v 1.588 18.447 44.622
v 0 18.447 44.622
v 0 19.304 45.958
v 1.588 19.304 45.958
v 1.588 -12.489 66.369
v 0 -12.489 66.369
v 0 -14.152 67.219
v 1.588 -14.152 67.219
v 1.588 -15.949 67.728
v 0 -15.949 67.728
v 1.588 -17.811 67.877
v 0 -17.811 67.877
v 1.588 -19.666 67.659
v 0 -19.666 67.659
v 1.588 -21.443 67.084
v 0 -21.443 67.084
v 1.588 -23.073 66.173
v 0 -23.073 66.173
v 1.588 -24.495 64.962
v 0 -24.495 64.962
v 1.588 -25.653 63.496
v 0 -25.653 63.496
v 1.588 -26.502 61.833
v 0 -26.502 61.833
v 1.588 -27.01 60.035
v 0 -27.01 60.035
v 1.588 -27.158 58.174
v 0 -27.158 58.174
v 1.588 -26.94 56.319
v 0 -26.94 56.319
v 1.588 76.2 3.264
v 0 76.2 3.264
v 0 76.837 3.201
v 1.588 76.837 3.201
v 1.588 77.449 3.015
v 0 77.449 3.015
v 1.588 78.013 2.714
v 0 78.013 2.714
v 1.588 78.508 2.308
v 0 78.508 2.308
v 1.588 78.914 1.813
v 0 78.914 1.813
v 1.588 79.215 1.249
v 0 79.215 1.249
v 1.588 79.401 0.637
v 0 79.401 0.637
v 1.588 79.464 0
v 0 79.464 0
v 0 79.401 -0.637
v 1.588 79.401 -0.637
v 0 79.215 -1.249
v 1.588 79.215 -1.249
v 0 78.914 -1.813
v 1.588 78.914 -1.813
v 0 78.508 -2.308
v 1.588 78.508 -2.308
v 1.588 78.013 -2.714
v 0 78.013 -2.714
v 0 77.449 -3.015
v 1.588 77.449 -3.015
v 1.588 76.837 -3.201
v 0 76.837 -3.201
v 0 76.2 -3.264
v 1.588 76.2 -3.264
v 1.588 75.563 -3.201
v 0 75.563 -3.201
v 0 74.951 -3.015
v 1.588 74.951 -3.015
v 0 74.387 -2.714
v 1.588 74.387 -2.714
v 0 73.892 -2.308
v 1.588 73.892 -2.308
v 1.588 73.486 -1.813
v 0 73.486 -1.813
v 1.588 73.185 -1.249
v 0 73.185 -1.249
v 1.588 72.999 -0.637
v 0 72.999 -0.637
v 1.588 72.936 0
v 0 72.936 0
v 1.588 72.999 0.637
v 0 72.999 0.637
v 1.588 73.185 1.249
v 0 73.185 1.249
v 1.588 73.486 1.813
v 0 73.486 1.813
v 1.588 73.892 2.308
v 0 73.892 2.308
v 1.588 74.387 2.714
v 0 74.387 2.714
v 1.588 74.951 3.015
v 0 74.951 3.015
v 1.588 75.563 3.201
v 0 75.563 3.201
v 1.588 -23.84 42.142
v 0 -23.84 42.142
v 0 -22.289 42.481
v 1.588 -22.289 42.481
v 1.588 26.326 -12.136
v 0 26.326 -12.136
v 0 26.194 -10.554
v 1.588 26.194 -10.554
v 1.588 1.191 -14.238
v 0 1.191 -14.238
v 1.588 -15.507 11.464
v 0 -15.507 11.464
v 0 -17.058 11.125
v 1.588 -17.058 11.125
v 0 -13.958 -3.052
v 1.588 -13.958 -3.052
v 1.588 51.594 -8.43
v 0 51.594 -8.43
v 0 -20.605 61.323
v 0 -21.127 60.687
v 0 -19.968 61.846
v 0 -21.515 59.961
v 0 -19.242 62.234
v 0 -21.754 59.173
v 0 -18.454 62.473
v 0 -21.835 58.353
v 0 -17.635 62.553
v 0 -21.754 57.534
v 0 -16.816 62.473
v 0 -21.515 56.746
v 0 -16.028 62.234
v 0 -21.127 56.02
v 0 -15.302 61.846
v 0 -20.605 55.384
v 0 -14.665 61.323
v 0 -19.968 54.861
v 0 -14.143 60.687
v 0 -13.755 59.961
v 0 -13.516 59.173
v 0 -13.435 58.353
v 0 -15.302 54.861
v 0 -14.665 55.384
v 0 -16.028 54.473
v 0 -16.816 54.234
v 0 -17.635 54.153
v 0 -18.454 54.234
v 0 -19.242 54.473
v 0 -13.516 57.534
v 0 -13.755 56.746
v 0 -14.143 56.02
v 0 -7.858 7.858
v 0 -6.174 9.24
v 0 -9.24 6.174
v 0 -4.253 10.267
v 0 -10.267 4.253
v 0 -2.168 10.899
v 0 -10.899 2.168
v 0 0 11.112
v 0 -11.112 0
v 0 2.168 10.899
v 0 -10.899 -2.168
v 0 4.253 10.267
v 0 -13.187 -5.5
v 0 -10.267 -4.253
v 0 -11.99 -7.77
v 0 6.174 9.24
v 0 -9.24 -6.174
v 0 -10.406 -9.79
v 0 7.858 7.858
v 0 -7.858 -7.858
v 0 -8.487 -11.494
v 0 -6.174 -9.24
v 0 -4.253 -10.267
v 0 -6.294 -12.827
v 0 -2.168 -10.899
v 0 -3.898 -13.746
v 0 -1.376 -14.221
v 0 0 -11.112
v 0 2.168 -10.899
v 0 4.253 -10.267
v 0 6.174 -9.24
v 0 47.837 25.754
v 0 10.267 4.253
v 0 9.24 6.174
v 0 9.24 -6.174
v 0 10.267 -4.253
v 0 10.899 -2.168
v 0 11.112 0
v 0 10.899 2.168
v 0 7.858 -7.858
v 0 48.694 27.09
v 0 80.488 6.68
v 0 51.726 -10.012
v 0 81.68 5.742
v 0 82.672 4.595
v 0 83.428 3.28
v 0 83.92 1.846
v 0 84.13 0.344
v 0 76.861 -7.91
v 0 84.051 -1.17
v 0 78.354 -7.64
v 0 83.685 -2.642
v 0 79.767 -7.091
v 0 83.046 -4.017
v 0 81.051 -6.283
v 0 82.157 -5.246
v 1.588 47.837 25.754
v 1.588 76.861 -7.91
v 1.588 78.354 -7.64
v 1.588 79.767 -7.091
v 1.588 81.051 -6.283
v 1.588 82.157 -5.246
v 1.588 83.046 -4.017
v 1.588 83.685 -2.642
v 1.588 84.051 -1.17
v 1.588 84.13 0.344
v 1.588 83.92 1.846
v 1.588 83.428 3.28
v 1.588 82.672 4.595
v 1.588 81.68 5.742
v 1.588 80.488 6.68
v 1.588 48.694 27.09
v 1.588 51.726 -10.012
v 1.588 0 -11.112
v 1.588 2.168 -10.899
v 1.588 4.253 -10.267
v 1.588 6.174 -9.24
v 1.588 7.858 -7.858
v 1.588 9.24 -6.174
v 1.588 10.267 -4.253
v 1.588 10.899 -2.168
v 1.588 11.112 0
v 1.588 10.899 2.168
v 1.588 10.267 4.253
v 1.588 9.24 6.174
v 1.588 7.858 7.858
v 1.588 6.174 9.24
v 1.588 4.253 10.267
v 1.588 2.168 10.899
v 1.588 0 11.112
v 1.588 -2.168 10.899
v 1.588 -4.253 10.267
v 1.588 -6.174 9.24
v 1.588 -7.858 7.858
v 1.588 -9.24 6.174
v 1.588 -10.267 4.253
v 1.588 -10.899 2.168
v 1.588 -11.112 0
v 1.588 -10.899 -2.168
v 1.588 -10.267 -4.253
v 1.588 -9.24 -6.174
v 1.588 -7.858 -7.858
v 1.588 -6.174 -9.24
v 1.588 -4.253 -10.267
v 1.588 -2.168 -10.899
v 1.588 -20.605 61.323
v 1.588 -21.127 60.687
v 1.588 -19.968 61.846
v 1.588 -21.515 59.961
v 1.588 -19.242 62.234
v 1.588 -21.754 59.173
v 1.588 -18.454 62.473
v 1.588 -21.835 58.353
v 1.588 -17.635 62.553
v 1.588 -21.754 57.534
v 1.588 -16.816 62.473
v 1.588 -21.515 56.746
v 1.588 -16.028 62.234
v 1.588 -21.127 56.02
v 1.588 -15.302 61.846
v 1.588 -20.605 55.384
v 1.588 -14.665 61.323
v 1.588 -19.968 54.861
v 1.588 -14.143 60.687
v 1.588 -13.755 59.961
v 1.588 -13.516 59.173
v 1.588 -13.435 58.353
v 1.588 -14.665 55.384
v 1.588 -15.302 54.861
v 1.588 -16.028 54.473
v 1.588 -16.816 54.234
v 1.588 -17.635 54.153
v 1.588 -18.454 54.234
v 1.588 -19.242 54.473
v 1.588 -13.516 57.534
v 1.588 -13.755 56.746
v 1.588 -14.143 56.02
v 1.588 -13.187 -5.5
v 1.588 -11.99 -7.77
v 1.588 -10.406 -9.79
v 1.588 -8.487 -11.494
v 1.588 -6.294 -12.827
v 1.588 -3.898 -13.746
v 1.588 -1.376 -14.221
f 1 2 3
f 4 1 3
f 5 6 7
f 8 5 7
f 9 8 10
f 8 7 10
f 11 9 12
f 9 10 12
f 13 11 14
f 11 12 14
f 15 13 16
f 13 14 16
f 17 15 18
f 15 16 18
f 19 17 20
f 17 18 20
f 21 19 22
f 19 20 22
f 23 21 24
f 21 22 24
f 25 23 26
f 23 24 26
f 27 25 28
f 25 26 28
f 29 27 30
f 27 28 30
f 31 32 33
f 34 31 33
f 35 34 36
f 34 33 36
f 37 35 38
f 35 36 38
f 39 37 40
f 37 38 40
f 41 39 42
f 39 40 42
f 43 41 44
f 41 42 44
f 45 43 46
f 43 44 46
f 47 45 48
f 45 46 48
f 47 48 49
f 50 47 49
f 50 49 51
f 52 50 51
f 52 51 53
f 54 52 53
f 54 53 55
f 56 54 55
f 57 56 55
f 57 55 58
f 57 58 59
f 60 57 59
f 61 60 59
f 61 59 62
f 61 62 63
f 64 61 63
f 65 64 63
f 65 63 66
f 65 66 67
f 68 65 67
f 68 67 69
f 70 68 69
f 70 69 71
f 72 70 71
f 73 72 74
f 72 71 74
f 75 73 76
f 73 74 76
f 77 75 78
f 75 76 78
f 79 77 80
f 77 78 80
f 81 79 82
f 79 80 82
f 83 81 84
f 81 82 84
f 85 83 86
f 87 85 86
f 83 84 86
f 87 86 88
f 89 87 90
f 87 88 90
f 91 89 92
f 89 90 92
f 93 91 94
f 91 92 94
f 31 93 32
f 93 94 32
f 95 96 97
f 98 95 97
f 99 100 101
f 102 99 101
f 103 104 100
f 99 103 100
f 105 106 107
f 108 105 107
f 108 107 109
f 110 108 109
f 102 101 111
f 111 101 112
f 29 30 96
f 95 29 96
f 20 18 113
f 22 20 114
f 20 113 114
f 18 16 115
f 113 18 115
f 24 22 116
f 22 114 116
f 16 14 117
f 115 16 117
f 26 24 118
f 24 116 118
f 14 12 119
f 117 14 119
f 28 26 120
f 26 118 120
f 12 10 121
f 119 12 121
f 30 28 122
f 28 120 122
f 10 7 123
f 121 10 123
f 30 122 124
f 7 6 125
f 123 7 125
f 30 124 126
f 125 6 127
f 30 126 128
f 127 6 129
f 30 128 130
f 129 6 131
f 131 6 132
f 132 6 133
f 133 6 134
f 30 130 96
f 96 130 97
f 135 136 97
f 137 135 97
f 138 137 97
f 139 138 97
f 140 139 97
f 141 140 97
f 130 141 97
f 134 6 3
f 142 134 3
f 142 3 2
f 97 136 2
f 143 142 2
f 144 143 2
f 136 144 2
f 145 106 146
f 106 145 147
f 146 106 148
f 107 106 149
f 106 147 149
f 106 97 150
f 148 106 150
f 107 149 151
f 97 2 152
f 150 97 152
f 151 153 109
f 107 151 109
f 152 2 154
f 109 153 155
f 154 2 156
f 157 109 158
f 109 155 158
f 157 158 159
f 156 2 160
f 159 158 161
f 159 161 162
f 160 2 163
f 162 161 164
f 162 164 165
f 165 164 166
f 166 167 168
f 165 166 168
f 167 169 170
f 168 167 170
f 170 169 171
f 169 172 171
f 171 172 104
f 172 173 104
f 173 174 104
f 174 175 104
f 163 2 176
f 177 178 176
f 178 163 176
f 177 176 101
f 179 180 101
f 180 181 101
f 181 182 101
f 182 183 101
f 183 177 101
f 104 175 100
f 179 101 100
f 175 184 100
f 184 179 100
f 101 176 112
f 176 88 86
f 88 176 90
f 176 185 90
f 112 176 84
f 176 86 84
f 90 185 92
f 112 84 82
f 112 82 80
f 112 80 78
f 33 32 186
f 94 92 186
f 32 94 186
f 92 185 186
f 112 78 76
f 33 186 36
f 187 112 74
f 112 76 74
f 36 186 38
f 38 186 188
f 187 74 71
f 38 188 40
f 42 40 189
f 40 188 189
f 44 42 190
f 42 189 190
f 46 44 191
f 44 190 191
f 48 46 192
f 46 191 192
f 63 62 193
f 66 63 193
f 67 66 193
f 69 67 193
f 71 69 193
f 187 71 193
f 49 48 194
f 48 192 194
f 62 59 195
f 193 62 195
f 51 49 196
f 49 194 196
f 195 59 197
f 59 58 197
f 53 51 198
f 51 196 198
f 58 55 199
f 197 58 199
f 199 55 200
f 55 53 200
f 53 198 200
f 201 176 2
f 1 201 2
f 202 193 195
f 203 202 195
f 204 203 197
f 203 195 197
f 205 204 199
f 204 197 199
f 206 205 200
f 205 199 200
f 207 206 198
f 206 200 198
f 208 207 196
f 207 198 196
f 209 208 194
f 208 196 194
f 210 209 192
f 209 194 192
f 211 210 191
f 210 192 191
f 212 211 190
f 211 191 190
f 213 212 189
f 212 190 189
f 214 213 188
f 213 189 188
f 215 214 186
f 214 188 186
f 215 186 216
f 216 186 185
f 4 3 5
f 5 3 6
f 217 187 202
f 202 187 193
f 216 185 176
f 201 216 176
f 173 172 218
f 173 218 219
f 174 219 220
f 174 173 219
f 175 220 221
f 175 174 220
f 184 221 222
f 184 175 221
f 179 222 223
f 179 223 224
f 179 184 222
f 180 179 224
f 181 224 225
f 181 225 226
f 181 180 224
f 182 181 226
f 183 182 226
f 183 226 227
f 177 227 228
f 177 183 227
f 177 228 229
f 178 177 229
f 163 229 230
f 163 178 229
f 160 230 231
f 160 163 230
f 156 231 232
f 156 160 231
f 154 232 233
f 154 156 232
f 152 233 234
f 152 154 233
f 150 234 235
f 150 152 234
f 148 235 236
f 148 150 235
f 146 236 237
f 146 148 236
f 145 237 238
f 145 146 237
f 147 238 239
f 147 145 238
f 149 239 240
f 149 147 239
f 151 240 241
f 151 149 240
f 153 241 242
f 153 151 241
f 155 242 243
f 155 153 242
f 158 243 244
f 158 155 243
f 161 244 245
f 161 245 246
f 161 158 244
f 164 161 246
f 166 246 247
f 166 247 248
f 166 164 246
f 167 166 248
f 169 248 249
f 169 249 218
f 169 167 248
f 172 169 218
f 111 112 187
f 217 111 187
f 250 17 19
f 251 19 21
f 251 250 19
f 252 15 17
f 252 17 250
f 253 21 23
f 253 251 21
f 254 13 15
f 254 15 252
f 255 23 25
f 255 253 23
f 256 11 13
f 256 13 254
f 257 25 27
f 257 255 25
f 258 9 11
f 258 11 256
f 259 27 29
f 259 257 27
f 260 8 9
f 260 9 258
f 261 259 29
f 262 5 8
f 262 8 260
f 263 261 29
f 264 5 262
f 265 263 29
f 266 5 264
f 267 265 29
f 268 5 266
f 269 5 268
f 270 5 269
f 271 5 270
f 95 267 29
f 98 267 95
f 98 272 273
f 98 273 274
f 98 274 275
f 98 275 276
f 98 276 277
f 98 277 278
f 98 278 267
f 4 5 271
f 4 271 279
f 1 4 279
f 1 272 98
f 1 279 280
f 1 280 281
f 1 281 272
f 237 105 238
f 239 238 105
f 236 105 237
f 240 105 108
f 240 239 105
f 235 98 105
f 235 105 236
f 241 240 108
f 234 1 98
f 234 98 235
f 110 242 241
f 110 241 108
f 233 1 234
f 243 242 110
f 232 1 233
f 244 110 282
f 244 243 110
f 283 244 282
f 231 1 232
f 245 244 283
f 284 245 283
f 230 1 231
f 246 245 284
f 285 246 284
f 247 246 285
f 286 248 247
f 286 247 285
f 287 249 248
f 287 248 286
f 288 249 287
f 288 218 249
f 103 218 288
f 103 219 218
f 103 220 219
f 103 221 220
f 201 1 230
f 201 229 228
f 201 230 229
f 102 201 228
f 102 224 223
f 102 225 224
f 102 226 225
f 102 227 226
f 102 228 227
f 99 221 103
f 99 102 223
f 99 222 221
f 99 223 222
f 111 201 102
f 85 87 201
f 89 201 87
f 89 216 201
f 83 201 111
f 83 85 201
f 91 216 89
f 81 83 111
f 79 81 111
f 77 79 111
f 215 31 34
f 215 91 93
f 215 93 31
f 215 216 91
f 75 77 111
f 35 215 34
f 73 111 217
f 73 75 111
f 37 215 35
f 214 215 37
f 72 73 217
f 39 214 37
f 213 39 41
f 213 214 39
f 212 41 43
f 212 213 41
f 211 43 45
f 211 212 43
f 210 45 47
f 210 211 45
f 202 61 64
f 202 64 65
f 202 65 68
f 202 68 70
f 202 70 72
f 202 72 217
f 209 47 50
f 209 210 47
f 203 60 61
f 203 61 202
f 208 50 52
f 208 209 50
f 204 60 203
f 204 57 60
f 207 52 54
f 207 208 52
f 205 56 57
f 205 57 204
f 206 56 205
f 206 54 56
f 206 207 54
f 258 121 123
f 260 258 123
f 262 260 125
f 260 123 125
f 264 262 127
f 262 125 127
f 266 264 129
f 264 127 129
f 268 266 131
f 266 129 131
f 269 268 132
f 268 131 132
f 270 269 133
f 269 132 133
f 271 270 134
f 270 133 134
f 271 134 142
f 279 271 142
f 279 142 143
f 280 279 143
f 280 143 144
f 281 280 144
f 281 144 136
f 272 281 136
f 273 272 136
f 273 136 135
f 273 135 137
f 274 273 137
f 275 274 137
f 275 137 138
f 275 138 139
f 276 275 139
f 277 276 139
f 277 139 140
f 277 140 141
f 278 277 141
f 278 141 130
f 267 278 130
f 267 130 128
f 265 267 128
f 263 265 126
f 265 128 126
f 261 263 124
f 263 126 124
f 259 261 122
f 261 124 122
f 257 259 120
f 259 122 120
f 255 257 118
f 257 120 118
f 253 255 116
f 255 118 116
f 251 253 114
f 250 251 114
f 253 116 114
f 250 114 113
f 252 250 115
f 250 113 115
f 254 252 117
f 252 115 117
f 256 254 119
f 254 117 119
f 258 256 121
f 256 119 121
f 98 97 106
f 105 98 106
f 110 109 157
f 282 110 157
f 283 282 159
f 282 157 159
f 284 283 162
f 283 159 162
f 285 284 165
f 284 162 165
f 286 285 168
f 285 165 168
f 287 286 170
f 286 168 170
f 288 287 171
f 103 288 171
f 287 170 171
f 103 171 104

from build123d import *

# Parameters (mm, degrees)
SKETCH1_R               = 11.1125
BOSS_EXTRUDE1_DEPTH     = 1.5875
F_1_4_CLEARANCE_HOLE1_D = 6.5278
M8_CLEARANCE_HOLE1_D    = 8.4


with BuildPart() as part:
    # Sketch1 → Boss-Extrude1 (new body)
    with BuildSketch(Plane(origin=(0, 0, 0), x_dir=(0, 0, -1), z_dir=(1, 0, 0))):
        with BuildLine():
            ThreePointArc((-66.368901101, -12.489303685), (-66.173253482, -23.073465422), (-56.318740763, -26.940161264))
            Line((-56.318740763, -26.940161264), (-42.141879325, -23.840144889))
            Line((-42.141879325, -23.840144889), (-42.481000758, -22.28928935))
            Line((-42.481000758, -22.28928935), (-11.463889973, -15.506860689))
            Line((-11.463889973, -15.506860689), (-11.12476854, -17.057716228))
            Line((-11.12476854, -17.057716228), (3.052092897, -13.957699853))
            ThreePointArc((3.052092897, -13.957699853), (11.493610044, -8.487024473), (14.237804197, 1.190625))
            Line((14.237804197, 1.190625), (12.135875062, 26.326041667))
            Line((12.135875062, 26.326041667), (10.553896818, 26.19375))
            Line((10.553896818, 26.19375), (8.429842112, 51.59375))
            Line((8.429842112, 51.59375), (10.011820356, 51.726041667))
            Line((10.011820356, 51.726041667), (7.909891221, 76.861458333))
            ThreePointArc((7.909891221, 76.861458333), (1.914833772, 83.903071977), (-6.67952645, 80.488103619))
            Line((-6.67952645, 80.488103619), (-27.090385813, 48.694358158))
            Line((-27.090385813, 48.694358158), (-25.754480523, 47.836737434))
            Line((-25.754480523, 47.836737434), (-44.622136448, 18.446821053))
            Line((-44.622136448, 18.446821053), (-45.958041738, 19.304441777))
            Line((-45.958041738, 19.304441777), (-66.368901101, -12.489303685))
        make_face()
        Circle(SKETCH1_R, mode=Mode.SUBTRACT)
    extrude(amount=BOSS_EXTRUDE1_DEPTH)

    # 1/4 Clearance Hole1 (through all)
    with Locations(Plane(origin=(1.5875, 0, 0), x_dir=(0, 0, -1), z_dir=(1, 0, 0))):
        with Locations((0, 76.2)):
            Hole(F_1_4_CLEARANCE_HOLE1_D / 2)

    # M8 Clearance Hole1 (through all)
    with Locations(Plane(origin=(1.5875, 0, 0), x_dir=(0, 0, -1), z_dir=(1, 0, 0))):
        with Locations((-58.353469361, -17.635028028)):
            Hole(M8_CLEARANCE_HOLE1_D / 2)


solid = part.part
